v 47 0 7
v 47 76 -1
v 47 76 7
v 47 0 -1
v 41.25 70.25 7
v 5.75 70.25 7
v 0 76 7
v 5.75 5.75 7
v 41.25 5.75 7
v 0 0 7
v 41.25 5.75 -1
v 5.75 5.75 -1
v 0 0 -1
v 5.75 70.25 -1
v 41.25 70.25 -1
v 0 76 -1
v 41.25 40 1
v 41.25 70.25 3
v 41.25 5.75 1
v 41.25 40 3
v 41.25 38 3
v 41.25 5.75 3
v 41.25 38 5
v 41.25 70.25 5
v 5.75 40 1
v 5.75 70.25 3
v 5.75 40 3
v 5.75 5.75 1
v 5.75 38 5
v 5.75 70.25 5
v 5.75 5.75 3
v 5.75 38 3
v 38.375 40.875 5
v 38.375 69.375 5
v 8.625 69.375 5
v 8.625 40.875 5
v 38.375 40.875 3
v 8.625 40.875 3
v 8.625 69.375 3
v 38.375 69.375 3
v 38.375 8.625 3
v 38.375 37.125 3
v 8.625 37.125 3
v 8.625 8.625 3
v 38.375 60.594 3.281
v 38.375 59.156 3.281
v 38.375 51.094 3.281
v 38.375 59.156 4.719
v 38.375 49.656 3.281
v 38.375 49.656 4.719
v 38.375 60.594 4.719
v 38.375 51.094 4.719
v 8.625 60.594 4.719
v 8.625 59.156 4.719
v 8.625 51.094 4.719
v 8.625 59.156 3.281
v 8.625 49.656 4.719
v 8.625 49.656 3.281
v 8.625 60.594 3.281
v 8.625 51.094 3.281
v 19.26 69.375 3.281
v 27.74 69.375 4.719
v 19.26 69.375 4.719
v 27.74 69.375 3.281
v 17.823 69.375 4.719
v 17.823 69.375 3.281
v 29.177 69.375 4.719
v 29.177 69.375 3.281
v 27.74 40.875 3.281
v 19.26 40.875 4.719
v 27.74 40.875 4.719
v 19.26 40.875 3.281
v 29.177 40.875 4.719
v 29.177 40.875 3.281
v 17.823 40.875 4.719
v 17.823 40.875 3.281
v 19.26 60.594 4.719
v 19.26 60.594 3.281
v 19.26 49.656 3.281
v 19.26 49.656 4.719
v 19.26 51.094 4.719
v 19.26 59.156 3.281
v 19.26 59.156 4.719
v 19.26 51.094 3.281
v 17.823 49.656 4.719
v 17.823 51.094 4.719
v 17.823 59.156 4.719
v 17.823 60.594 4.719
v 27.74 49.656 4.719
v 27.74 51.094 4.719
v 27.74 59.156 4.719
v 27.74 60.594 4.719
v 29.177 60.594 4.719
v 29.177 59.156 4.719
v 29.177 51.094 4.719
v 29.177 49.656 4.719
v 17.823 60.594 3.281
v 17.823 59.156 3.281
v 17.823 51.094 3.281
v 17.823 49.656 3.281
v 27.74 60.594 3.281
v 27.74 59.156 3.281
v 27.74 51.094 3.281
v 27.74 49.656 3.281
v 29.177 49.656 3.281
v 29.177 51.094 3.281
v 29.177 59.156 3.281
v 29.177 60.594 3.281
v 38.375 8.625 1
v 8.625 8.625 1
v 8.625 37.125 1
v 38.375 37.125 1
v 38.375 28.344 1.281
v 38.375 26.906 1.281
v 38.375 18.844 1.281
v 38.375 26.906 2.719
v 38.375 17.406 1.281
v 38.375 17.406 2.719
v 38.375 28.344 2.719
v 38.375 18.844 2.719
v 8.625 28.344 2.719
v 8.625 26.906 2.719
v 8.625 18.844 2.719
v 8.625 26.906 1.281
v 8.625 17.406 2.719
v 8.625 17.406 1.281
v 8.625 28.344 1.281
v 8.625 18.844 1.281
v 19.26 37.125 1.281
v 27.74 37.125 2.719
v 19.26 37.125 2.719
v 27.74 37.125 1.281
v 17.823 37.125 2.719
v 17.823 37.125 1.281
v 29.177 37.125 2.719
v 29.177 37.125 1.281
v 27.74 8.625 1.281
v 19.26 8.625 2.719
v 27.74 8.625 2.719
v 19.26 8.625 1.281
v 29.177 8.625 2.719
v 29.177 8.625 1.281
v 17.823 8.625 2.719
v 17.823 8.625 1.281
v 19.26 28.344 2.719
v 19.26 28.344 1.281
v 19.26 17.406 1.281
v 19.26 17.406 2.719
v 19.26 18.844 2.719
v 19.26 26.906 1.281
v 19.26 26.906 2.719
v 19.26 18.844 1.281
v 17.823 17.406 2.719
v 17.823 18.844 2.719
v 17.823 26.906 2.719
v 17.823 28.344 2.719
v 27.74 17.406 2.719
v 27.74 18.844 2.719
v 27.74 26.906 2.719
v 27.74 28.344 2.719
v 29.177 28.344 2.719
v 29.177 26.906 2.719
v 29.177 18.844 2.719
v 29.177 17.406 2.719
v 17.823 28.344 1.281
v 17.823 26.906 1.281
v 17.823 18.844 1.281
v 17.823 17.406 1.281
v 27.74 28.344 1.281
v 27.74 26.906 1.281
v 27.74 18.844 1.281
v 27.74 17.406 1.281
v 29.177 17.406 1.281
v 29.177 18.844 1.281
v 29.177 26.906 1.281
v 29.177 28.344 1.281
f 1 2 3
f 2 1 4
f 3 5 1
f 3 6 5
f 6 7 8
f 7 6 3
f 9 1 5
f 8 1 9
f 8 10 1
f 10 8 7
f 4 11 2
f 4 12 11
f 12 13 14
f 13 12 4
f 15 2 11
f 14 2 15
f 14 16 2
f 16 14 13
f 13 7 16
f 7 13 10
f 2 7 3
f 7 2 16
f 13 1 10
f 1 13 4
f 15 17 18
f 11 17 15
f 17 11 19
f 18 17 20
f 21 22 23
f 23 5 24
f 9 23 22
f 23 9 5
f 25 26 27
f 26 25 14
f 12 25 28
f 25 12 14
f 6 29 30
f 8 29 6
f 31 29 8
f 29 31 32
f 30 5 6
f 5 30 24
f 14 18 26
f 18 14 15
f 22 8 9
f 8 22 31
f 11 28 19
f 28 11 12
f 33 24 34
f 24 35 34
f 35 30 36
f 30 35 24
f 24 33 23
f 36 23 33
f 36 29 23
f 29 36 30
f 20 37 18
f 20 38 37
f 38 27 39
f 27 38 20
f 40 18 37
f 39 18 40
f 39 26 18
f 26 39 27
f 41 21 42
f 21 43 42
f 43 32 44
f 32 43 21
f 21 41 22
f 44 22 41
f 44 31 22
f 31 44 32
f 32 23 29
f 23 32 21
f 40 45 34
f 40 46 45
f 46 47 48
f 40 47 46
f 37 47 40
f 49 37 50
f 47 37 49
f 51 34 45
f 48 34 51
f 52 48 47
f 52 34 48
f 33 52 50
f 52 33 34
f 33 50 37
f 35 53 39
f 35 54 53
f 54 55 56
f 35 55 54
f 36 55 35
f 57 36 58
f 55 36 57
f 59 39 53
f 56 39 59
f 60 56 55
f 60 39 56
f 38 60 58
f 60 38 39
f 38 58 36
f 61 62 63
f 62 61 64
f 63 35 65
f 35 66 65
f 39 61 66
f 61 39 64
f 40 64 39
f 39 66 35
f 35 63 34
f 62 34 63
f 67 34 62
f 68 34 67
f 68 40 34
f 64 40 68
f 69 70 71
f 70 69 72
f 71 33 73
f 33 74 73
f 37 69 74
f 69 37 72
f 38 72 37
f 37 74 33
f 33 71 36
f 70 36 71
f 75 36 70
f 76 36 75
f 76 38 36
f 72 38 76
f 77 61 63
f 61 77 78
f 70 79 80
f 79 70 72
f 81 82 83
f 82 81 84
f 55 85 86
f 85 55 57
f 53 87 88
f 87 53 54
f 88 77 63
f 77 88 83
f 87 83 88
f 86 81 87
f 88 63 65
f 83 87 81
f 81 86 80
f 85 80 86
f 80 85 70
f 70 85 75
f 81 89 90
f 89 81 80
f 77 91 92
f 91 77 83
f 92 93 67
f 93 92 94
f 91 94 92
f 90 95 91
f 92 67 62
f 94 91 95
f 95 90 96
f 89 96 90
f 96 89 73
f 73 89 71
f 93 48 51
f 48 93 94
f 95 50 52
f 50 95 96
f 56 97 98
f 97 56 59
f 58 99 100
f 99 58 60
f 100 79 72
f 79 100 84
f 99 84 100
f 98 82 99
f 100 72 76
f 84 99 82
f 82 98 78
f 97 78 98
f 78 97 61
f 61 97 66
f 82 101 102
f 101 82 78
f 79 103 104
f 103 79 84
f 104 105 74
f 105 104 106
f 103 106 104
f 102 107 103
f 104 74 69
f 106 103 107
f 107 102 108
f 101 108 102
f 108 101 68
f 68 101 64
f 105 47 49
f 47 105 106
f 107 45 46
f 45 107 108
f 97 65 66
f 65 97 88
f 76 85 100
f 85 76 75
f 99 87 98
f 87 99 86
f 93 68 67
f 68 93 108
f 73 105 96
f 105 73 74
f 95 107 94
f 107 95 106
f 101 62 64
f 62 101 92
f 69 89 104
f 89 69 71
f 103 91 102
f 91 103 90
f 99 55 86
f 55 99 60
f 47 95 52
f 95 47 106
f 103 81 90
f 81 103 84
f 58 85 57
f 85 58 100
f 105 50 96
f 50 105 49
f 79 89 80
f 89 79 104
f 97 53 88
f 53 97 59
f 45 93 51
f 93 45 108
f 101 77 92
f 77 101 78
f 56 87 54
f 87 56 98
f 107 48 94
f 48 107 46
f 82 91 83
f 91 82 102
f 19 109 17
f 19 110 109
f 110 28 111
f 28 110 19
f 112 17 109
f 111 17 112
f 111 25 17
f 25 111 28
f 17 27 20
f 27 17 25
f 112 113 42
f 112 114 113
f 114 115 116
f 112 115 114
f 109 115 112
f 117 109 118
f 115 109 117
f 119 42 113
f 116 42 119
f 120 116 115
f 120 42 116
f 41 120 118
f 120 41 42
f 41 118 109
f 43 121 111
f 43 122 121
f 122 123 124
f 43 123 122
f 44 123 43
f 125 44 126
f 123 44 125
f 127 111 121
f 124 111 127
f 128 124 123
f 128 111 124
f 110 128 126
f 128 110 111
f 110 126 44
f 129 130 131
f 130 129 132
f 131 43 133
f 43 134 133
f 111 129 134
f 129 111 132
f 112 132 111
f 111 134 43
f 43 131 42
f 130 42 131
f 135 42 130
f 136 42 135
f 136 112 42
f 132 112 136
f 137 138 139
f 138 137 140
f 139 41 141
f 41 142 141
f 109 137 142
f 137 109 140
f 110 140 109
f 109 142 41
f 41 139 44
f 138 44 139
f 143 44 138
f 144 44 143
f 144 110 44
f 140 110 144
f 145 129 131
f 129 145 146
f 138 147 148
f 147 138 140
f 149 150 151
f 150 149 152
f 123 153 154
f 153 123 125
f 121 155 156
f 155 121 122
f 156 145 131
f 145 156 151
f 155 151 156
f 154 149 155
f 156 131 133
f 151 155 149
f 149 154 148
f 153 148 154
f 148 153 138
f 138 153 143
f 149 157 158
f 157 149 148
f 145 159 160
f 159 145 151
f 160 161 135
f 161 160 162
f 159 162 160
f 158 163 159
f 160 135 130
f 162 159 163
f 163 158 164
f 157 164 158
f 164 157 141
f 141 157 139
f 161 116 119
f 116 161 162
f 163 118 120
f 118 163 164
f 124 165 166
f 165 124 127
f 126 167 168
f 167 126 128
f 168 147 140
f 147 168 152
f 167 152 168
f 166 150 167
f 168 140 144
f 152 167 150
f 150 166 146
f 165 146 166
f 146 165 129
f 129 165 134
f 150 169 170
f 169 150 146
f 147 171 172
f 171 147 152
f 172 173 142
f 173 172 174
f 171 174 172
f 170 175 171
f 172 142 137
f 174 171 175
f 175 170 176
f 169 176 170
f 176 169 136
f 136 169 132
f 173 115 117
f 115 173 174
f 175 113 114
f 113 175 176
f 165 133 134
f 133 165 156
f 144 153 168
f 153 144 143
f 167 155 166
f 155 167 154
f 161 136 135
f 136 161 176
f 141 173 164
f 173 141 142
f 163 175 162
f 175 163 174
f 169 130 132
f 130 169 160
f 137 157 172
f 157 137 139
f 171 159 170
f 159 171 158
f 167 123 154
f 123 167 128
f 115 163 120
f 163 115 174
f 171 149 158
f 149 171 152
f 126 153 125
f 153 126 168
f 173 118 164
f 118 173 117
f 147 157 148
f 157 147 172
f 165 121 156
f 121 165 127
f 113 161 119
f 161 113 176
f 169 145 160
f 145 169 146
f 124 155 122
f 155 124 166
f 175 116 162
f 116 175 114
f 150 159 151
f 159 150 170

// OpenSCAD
// file: sash.scad
module grill(offset, size, count) {
  if (count > 1) {
    translate(offset) cube(size, true);
    translate(offset) grill(offset, size, count - 1);
  }
} 

module Sash(
  // These parameters are required
  width,  // The total outside width of the window (including the casing.)
  height, // the total outside height of the window (including the apron and head)
  depth, // The total depth of the window, including the jamb
  rail_width, //the height of the top and bottom rail(s)
  grill_width, // the width of the grill
  pane_cols, // how many panes (horizontal)
  pane_rows, // how many panes (vertical)
) {
  assert(width, "Must provide a window width");
  assert(height, "Must provide a window height");
  assert(depth, "Must provide a window depth");
  assert(rail_width, "Must provide a rail width");
  assert(grill_width, "Must provide a grill width");
  assert(pane_cols, "Must provide the number of pane cols");
  assert(pane_rows, "must provide the number of pane rows");

  inner_width=(width-2*rail_width);
  inner_height=(height-2*rail_width);

  union() {
    difference() {
      cube([width,height,depth], false);
      translate([rail_width,rail_width,-1]) cube([inner_width, inner_height, depth+2], false);
    };

    // draw vertical sashes
    translate([rail_width, inner_height/2 + rail_width, depth/2]) grill(
      offset=[inner_width/pane_cols, 0, 0],
      size=[grill_width, inner_height, grill_width], 
      count=pane_cols
    );

    // draw horizontal sashes
    translate([inner_width/2 + rail_width, rail_width, depth/2]) grill(
      offset=[0, inner_height/pane_rows, 0],
      size=[inner_width, grill_width, grill_width], 
      count=pane_rows
    );
  }
}

Sash(width=24,height=36,depth=4,rail_width=2,grill_width=1,pane_cols=3,pane_rows=3);
// main file
use <sash.scad>

module DoubleSashWindow(
  // These parameters are required
  width,  // The total outside width of the window (including the casing.)
  height, // the total outside height of the window (including the apron and head)
  depth, // The total depth of the window, NOT including the casing the jamb
  casing_width, // the width of the casing, will also be default value for footer and apron
  casing_thickness, // the thickness of the casing, will also be default value for footer and apron
  
  // these have default values
  pane_rows=2,
  pane_cols=2,

  // These will be calculated from other parameters if they are not specified.
  head_width, // the width of the head board
  grill_width, // the width of each grill
  rail_width, // the width of the sash
  sash_thickness, // the thickness of the sash
  stool_depth, // total thickness of the stool (will protrude from front)
  apron_width, // the width of the apron
  rail_width, // the width of the rail
  jamb_thickness, // 
  casing_bottom,
) {
  assert(width, "Must provide a window width");
  assert(depth, "Must provide a window depth");
  assert(height, "Must provide a window height");
  assert(casing_width, "Must provide a casing width");
  assert(casing_thickness, "Must provide a casing thickness");

  if (!head_width) {
    head_width = casing_width;
  }

  rw = rail_width ? rail_width : casing_width/2;
  gw = grill_width ? grill_width : rw/2;
  st = sash_thickness ? sash_thickness : depth/3;
  cb = casing_bottom ? casing_bottom : casing_width;

  if (!stool_depth) {
    stool_depth = 1.1 * depth;
  }

  if (!apron_width) {
    apron_width = casing_width;
  }

  jamb_width = casing_width;
  inner_height = height - 2 * jamb_width;
  inner_width = width - 2 * jamb_width;

  union() {
    // draw the casing
    difference() {
      translate([0,0,-casing_thickness]) cube([width,height,depth + 2 * casing_thickness], false);
      translate([jamb_width,jamb_width,-depth/2]) 
        cube([inner_width, inner_height, depth*2], false);
    };

    // Draw the upper sash
    translate([jamb_width,jamb_width + inner_height/2,st*1.5]) Sash(
      width=inner_width, 
      height=inner_height/2 + st, 
      depth=st, 
      rail_width=rw,
      grill_width=gw,
      pane_cols=pane_cols,
      pane_rows=pane_rows
    );

    // draw the lower sash
    translate([jamb_width,jamb_width,st/2]) Sash(
      width=inner_width, 
      height=inner_height/2 + st, 
      depth=st, 
      rail_width=rw,
      grill_width=gw,
      pane_cols=pane_cols,
      pane_rows=pane_rows
    );
  }
}

DoubleSashWindow(width = 47 ,
                             height = 76 ,
                             depth = 6 ,
                             casing_width = 5.75 ,
                             casing_thickness = 1 ,
                             casing_bottom = 2 ,
                             pane_cols = 3,
                             pane_rows = 3);
